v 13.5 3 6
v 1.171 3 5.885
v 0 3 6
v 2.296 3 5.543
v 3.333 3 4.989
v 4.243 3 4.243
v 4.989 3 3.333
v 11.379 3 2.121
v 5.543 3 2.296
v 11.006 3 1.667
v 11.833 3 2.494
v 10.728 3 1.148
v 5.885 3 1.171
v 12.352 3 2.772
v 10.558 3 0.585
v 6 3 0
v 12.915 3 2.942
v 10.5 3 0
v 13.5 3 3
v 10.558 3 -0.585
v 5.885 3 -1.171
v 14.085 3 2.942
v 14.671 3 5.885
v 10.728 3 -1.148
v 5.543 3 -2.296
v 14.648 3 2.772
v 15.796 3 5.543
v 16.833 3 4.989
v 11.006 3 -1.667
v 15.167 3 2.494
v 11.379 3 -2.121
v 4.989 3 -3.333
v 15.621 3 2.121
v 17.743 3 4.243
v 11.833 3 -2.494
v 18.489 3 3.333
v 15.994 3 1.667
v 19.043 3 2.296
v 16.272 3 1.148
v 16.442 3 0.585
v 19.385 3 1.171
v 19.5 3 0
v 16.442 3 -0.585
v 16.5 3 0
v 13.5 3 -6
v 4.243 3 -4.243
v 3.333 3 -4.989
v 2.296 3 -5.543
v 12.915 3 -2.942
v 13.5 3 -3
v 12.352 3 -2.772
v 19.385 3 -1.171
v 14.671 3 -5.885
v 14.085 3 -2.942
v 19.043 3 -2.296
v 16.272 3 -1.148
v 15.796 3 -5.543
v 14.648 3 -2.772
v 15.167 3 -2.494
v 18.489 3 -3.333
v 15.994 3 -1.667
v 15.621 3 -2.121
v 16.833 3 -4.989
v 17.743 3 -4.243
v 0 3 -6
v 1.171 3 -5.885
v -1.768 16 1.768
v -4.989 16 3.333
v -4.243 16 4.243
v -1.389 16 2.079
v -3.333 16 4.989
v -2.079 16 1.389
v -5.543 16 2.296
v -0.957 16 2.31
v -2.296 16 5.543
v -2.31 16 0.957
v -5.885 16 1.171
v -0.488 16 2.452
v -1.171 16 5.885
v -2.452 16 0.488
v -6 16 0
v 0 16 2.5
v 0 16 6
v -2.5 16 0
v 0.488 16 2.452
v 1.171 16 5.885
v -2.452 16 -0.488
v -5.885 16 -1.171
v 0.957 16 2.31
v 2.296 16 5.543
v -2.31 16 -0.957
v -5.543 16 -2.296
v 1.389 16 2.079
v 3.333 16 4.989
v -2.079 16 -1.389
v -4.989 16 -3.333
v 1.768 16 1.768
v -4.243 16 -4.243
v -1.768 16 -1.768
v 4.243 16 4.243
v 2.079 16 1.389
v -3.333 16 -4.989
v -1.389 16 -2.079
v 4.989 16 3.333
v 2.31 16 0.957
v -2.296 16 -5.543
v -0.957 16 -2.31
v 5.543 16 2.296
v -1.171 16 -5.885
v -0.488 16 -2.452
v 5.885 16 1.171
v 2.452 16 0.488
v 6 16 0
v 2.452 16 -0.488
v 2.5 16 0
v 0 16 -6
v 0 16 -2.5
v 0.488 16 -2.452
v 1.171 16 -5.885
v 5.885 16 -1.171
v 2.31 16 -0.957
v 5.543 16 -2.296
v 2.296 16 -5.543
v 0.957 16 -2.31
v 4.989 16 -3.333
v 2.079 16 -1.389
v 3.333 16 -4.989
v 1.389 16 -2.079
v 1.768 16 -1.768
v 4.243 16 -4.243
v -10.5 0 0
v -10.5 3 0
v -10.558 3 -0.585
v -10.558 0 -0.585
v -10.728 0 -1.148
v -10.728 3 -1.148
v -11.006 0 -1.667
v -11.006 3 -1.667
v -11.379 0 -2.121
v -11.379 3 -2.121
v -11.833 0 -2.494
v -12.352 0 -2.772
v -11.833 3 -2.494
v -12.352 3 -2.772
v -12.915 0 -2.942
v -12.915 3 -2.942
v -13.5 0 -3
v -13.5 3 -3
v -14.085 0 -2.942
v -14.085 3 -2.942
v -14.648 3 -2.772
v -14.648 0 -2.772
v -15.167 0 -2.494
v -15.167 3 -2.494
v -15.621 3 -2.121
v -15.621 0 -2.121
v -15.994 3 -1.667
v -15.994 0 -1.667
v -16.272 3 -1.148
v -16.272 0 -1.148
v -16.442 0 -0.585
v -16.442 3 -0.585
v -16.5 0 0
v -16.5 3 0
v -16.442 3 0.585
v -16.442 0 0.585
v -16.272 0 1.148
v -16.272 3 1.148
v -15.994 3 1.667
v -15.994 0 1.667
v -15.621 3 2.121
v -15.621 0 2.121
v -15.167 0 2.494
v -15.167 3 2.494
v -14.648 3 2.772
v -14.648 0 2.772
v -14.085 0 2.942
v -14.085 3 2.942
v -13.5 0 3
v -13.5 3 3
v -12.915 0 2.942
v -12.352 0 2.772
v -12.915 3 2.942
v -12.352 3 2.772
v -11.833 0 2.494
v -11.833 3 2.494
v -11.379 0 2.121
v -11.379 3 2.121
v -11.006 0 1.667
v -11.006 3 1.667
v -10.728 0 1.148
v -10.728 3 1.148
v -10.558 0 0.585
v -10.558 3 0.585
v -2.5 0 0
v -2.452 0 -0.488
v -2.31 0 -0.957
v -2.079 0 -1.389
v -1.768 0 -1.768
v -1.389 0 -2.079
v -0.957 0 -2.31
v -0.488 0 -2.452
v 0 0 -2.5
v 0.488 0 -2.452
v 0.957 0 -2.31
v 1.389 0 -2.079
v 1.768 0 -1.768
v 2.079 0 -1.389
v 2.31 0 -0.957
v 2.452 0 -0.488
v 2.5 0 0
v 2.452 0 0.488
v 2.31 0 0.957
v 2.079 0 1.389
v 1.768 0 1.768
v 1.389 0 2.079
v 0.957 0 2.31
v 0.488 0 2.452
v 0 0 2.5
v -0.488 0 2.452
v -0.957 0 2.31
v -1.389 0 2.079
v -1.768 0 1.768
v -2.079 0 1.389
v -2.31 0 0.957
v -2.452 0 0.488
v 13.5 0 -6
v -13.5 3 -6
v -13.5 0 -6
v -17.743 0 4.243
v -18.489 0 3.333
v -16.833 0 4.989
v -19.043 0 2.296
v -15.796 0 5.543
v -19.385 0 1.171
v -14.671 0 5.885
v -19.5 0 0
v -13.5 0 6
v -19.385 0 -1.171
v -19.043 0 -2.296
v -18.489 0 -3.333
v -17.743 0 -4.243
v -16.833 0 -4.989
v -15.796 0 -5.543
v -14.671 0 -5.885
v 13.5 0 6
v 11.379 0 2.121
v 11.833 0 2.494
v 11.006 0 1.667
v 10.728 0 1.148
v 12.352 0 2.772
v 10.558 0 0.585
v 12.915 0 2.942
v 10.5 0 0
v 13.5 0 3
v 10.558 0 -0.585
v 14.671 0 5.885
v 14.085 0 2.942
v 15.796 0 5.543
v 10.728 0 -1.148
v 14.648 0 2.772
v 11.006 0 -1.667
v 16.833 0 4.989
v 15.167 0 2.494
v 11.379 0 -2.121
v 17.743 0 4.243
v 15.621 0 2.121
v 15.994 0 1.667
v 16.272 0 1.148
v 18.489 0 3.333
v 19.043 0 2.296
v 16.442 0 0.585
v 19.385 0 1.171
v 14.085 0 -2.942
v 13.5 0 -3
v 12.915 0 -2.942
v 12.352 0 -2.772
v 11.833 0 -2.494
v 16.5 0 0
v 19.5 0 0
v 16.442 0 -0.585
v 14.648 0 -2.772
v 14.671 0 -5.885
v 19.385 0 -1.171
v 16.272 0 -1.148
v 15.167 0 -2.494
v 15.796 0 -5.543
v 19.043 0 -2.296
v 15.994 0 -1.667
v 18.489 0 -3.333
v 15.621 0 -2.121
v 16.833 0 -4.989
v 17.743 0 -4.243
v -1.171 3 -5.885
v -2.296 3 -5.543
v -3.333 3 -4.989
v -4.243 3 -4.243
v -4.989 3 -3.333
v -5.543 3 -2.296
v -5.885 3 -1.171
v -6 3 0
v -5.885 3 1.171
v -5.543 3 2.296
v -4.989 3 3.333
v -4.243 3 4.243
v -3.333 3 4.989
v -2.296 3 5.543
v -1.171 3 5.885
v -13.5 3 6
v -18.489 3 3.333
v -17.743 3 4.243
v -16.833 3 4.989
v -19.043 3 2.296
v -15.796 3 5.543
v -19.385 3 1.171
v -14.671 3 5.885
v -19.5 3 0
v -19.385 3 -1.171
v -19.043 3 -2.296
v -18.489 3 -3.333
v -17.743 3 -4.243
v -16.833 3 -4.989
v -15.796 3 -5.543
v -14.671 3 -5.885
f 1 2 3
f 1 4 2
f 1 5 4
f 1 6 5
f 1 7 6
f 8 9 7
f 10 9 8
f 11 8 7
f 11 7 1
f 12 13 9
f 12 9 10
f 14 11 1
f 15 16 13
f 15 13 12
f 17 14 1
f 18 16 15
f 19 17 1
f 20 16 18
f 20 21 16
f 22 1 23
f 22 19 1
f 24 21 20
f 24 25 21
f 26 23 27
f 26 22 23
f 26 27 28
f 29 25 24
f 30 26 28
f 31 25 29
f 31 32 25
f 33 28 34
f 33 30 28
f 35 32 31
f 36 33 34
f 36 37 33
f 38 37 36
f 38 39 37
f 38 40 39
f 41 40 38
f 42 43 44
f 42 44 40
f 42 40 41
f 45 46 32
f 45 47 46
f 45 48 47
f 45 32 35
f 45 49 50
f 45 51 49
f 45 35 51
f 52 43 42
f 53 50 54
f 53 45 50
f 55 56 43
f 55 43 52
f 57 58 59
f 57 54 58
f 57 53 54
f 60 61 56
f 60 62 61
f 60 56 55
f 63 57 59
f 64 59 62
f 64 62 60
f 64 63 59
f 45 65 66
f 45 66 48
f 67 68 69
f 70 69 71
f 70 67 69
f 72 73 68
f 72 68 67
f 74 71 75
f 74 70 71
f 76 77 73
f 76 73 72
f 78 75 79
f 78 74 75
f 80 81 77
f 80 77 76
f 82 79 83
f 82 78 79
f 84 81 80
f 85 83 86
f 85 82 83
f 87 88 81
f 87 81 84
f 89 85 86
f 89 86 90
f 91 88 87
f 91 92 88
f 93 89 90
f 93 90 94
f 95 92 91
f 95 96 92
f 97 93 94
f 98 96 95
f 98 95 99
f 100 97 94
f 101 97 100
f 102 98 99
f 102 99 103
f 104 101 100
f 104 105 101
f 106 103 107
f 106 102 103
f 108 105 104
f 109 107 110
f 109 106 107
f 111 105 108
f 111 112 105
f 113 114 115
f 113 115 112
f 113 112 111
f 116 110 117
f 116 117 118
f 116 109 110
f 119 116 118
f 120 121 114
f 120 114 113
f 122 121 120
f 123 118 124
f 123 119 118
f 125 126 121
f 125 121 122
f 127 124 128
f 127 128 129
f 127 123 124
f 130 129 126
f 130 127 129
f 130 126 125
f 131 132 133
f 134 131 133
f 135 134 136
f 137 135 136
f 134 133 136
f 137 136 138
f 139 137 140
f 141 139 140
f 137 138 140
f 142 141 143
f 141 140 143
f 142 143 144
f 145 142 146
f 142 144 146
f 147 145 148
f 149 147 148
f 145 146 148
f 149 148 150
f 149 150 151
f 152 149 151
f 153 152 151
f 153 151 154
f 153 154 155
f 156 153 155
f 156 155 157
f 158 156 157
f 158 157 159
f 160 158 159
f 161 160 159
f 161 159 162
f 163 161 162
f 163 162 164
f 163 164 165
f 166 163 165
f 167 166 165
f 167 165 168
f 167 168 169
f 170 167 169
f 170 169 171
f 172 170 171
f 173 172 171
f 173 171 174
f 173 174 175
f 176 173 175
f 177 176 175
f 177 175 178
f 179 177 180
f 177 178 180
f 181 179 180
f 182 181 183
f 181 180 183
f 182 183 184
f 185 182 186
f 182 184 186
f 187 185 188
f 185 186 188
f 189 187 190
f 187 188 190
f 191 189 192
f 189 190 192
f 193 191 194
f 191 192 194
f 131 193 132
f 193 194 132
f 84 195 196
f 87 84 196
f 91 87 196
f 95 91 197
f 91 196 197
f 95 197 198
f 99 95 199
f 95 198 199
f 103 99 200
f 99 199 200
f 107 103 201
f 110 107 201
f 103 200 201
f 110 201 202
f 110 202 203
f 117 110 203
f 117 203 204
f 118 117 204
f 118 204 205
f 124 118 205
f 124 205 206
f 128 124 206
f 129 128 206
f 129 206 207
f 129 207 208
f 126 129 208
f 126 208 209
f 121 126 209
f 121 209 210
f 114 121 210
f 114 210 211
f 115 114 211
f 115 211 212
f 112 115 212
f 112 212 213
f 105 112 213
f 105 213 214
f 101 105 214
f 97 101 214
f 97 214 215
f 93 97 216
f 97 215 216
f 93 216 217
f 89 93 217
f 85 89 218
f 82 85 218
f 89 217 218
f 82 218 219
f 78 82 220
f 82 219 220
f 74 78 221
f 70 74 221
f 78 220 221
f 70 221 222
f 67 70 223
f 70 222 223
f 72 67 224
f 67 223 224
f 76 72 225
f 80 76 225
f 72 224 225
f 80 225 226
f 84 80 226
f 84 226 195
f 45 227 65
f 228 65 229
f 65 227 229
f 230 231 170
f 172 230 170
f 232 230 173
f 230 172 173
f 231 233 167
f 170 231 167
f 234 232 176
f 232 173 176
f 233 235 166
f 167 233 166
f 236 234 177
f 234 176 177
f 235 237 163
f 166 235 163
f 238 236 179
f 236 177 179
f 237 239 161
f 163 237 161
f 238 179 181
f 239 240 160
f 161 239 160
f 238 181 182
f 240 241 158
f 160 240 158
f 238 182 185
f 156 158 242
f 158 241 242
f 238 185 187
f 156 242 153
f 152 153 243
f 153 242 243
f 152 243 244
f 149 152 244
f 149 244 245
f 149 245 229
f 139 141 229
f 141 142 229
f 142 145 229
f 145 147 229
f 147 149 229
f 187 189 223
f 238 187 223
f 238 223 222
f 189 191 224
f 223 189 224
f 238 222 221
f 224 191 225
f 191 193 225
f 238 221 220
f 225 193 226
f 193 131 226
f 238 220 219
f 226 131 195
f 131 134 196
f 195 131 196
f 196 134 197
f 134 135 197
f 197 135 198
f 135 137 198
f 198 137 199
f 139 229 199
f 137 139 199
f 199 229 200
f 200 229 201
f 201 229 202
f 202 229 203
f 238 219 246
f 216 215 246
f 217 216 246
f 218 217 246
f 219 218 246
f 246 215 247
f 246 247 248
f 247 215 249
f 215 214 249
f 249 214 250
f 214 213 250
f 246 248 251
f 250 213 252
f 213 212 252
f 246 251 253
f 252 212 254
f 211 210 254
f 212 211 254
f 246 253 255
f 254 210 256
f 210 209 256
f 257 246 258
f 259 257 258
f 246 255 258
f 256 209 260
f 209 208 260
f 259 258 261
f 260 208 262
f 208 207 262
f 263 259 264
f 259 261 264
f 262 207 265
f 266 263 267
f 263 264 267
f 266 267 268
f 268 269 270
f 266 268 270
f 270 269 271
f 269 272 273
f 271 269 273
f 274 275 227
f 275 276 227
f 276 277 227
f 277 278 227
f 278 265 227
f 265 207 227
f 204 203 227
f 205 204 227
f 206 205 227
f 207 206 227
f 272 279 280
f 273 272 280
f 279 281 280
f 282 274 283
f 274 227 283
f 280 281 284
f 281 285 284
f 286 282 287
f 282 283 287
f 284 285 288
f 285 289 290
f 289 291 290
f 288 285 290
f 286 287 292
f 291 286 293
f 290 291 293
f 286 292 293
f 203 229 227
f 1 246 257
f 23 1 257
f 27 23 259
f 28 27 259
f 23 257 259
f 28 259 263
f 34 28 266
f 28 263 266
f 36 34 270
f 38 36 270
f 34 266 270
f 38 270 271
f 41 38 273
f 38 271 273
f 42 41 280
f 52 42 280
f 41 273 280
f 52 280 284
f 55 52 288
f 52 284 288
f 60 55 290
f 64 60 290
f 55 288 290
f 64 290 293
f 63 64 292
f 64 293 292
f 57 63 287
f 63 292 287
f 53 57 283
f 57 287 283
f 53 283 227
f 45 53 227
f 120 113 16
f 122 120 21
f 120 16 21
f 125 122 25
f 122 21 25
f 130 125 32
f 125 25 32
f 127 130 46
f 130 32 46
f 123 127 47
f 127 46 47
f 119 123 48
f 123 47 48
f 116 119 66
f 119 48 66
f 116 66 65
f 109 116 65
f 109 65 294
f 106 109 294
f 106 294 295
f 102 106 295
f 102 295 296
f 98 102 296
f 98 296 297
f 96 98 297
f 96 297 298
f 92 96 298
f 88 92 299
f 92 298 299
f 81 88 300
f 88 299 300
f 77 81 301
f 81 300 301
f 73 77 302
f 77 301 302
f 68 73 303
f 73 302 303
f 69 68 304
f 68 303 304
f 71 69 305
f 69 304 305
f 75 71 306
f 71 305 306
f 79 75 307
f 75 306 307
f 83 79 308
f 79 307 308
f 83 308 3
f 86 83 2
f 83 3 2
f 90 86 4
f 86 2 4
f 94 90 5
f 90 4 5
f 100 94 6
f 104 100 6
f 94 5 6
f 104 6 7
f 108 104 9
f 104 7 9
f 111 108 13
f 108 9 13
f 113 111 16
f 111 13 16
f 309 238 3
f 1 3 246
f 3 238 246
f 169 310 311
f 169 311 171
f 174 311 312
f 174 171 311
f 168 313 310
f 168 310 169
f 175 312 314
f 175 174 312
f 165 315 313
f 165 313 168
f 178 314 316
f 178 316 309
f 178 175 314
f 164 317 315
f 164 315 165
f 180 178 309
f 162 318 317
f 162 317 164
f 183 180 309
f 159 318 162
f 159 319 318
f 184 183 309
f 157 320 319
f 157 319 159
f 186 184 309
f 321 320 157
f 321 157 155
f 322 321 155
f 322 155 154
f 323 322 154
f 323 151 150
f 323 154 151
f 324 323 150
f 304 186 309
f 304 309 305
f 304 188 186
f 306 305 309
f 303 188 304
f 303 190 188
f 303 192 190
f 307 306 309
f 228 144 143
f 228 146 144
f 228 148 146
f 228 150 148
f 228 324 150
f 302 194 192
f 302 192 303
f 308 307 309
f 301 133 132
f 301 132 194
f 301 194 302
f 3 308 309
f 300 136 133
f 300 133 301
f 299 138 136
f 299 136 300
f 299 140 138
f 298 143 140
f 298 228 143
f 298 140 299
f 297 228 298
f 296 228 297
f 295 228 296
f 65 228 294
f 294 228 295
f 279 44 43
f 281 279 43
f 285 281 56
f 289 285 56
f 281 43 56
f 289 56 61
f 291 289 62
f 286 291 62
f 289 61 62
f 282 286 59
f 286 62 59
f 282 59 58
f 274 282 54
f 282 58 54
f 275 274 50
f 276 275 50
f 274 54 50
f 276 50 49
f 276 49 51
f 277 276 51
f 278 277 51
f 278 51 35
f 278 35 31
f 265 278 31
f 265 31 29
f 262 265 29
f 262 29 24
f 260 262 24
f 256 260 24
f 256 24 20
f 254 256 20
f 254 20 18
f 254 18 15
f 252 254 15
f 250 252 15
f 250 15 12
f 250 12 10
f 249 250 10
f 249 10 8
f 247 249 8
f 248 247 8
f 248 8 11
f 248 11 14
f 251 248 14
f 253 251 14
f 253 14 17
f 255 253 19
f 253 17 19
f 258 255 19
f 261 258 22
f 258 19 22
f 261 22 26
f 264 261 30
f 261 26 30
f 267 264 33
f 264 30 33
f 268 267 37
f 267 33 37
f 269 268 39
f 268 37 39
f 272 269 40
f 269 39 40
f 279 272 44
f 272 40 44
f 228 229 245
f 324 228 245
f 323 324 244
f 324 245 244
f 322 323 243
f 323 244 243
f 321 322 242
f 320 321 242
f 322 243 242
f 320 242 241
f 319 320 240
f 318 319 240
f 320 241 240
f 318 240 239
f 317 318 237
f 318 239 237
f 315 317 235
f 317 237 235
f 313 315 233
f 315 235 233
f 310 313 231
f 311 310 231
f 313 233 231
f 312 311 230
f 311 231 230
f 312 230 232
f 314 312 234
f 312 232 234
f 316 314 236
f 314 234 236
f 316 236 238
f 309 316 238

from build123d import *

# Parameters (mm, degrees)
SKETCH_1_R          = 6
EXTRUDE_1_DEPTH     = 3
SKETCH_2_R          = 6
EXTRUDE_2_DEPTH     = 13
HOLE_WIZARD_M6_1_D  = 5
SKETCH_6_R          = 3
CUT_EXTRUDE_1_DEPTH = 10


with BuildPart() as part:
    # 草图1 → 凸台-拉伸1 (new body)
    with BuildSketch(Plane(origin=(0, 0, 0), x_dir=(1, 0, 0), z_dir=(0, 1, 0))):
        with Locations((-13.5, 0)):
            Circle(SKETCH_1_R)
        with BuildLine():
            Line((13.5, 6), (-13.5, 6))
            ThreePointArc((-13.5, 6), (-9.257359313, 4.242640687), (-7.5, 0))
            ThreePointArc((-7.5, 0), (-9.257359313, -4.242640687), (-13.5, -6))
            Line((-13.5, -6), (13.5, -6))
            ThreePointArc((13.5, -6), (7.5, 0), (13.5, 6))
        make_face()
        with Locations((13.5, 0)):
            Circle(SKETCH_1_R)
        with BuildLine():
            Line((-13.5, -6), (-13.5, 6))
            ThreePointArc((-13.5, 6), (-19.5, 0), (-13.5, -6))
        make_face()
        with BuildLine():
            ThreePointArc((19.5, 0), (17.742640687, 4.242640687), (13.5, 6))
            Line((13.5, 6), (13.5, -6))
            ThreePointArc((13.5, -6), (17.742640687, -4.242640687), (19.5, 0))
        make_face()
    extrude(amount=EXTRUDE_1_DEPTH)

    # 草图2 → 凸台-拉伸2 (add)
    with BuildSketch(Plane(origin=(0, 3, 0), x_dir=(1, 0, 0), z_dir=(0, 1, 0))):
        Circle(SKETCH_2_R)
    extrude(amount=EXTRUDE_2_DEPTH)

    # M6 螺纹孔1 (through all)
    with Locations(Plane(origin=(0, 16, 0), x_dir=(1, 0, 0), z_dir=(0, 1, 0))):
        with Locations((0, 0)):
            Hole(HOLE_WIZARD_M6_1_D / 2)

    # 草图6 → 切除-拉伸1 (cut)
    with BuildSketch(Plane(origin=(0, 3, 0), x_dir=(1, 0, 0), z_dir=(0, 1, 0))):
        with Locations((-13.5, 0)):
            Circle(SKETCH_6_R)
        with Locations((13.5, 0)):
            Circle(SKETCH_6_R)
    extrude(amount=-CUT_EXTRUDE_1_DEPTH, mode=Mode.SUBTRACT)


solid = part.part
